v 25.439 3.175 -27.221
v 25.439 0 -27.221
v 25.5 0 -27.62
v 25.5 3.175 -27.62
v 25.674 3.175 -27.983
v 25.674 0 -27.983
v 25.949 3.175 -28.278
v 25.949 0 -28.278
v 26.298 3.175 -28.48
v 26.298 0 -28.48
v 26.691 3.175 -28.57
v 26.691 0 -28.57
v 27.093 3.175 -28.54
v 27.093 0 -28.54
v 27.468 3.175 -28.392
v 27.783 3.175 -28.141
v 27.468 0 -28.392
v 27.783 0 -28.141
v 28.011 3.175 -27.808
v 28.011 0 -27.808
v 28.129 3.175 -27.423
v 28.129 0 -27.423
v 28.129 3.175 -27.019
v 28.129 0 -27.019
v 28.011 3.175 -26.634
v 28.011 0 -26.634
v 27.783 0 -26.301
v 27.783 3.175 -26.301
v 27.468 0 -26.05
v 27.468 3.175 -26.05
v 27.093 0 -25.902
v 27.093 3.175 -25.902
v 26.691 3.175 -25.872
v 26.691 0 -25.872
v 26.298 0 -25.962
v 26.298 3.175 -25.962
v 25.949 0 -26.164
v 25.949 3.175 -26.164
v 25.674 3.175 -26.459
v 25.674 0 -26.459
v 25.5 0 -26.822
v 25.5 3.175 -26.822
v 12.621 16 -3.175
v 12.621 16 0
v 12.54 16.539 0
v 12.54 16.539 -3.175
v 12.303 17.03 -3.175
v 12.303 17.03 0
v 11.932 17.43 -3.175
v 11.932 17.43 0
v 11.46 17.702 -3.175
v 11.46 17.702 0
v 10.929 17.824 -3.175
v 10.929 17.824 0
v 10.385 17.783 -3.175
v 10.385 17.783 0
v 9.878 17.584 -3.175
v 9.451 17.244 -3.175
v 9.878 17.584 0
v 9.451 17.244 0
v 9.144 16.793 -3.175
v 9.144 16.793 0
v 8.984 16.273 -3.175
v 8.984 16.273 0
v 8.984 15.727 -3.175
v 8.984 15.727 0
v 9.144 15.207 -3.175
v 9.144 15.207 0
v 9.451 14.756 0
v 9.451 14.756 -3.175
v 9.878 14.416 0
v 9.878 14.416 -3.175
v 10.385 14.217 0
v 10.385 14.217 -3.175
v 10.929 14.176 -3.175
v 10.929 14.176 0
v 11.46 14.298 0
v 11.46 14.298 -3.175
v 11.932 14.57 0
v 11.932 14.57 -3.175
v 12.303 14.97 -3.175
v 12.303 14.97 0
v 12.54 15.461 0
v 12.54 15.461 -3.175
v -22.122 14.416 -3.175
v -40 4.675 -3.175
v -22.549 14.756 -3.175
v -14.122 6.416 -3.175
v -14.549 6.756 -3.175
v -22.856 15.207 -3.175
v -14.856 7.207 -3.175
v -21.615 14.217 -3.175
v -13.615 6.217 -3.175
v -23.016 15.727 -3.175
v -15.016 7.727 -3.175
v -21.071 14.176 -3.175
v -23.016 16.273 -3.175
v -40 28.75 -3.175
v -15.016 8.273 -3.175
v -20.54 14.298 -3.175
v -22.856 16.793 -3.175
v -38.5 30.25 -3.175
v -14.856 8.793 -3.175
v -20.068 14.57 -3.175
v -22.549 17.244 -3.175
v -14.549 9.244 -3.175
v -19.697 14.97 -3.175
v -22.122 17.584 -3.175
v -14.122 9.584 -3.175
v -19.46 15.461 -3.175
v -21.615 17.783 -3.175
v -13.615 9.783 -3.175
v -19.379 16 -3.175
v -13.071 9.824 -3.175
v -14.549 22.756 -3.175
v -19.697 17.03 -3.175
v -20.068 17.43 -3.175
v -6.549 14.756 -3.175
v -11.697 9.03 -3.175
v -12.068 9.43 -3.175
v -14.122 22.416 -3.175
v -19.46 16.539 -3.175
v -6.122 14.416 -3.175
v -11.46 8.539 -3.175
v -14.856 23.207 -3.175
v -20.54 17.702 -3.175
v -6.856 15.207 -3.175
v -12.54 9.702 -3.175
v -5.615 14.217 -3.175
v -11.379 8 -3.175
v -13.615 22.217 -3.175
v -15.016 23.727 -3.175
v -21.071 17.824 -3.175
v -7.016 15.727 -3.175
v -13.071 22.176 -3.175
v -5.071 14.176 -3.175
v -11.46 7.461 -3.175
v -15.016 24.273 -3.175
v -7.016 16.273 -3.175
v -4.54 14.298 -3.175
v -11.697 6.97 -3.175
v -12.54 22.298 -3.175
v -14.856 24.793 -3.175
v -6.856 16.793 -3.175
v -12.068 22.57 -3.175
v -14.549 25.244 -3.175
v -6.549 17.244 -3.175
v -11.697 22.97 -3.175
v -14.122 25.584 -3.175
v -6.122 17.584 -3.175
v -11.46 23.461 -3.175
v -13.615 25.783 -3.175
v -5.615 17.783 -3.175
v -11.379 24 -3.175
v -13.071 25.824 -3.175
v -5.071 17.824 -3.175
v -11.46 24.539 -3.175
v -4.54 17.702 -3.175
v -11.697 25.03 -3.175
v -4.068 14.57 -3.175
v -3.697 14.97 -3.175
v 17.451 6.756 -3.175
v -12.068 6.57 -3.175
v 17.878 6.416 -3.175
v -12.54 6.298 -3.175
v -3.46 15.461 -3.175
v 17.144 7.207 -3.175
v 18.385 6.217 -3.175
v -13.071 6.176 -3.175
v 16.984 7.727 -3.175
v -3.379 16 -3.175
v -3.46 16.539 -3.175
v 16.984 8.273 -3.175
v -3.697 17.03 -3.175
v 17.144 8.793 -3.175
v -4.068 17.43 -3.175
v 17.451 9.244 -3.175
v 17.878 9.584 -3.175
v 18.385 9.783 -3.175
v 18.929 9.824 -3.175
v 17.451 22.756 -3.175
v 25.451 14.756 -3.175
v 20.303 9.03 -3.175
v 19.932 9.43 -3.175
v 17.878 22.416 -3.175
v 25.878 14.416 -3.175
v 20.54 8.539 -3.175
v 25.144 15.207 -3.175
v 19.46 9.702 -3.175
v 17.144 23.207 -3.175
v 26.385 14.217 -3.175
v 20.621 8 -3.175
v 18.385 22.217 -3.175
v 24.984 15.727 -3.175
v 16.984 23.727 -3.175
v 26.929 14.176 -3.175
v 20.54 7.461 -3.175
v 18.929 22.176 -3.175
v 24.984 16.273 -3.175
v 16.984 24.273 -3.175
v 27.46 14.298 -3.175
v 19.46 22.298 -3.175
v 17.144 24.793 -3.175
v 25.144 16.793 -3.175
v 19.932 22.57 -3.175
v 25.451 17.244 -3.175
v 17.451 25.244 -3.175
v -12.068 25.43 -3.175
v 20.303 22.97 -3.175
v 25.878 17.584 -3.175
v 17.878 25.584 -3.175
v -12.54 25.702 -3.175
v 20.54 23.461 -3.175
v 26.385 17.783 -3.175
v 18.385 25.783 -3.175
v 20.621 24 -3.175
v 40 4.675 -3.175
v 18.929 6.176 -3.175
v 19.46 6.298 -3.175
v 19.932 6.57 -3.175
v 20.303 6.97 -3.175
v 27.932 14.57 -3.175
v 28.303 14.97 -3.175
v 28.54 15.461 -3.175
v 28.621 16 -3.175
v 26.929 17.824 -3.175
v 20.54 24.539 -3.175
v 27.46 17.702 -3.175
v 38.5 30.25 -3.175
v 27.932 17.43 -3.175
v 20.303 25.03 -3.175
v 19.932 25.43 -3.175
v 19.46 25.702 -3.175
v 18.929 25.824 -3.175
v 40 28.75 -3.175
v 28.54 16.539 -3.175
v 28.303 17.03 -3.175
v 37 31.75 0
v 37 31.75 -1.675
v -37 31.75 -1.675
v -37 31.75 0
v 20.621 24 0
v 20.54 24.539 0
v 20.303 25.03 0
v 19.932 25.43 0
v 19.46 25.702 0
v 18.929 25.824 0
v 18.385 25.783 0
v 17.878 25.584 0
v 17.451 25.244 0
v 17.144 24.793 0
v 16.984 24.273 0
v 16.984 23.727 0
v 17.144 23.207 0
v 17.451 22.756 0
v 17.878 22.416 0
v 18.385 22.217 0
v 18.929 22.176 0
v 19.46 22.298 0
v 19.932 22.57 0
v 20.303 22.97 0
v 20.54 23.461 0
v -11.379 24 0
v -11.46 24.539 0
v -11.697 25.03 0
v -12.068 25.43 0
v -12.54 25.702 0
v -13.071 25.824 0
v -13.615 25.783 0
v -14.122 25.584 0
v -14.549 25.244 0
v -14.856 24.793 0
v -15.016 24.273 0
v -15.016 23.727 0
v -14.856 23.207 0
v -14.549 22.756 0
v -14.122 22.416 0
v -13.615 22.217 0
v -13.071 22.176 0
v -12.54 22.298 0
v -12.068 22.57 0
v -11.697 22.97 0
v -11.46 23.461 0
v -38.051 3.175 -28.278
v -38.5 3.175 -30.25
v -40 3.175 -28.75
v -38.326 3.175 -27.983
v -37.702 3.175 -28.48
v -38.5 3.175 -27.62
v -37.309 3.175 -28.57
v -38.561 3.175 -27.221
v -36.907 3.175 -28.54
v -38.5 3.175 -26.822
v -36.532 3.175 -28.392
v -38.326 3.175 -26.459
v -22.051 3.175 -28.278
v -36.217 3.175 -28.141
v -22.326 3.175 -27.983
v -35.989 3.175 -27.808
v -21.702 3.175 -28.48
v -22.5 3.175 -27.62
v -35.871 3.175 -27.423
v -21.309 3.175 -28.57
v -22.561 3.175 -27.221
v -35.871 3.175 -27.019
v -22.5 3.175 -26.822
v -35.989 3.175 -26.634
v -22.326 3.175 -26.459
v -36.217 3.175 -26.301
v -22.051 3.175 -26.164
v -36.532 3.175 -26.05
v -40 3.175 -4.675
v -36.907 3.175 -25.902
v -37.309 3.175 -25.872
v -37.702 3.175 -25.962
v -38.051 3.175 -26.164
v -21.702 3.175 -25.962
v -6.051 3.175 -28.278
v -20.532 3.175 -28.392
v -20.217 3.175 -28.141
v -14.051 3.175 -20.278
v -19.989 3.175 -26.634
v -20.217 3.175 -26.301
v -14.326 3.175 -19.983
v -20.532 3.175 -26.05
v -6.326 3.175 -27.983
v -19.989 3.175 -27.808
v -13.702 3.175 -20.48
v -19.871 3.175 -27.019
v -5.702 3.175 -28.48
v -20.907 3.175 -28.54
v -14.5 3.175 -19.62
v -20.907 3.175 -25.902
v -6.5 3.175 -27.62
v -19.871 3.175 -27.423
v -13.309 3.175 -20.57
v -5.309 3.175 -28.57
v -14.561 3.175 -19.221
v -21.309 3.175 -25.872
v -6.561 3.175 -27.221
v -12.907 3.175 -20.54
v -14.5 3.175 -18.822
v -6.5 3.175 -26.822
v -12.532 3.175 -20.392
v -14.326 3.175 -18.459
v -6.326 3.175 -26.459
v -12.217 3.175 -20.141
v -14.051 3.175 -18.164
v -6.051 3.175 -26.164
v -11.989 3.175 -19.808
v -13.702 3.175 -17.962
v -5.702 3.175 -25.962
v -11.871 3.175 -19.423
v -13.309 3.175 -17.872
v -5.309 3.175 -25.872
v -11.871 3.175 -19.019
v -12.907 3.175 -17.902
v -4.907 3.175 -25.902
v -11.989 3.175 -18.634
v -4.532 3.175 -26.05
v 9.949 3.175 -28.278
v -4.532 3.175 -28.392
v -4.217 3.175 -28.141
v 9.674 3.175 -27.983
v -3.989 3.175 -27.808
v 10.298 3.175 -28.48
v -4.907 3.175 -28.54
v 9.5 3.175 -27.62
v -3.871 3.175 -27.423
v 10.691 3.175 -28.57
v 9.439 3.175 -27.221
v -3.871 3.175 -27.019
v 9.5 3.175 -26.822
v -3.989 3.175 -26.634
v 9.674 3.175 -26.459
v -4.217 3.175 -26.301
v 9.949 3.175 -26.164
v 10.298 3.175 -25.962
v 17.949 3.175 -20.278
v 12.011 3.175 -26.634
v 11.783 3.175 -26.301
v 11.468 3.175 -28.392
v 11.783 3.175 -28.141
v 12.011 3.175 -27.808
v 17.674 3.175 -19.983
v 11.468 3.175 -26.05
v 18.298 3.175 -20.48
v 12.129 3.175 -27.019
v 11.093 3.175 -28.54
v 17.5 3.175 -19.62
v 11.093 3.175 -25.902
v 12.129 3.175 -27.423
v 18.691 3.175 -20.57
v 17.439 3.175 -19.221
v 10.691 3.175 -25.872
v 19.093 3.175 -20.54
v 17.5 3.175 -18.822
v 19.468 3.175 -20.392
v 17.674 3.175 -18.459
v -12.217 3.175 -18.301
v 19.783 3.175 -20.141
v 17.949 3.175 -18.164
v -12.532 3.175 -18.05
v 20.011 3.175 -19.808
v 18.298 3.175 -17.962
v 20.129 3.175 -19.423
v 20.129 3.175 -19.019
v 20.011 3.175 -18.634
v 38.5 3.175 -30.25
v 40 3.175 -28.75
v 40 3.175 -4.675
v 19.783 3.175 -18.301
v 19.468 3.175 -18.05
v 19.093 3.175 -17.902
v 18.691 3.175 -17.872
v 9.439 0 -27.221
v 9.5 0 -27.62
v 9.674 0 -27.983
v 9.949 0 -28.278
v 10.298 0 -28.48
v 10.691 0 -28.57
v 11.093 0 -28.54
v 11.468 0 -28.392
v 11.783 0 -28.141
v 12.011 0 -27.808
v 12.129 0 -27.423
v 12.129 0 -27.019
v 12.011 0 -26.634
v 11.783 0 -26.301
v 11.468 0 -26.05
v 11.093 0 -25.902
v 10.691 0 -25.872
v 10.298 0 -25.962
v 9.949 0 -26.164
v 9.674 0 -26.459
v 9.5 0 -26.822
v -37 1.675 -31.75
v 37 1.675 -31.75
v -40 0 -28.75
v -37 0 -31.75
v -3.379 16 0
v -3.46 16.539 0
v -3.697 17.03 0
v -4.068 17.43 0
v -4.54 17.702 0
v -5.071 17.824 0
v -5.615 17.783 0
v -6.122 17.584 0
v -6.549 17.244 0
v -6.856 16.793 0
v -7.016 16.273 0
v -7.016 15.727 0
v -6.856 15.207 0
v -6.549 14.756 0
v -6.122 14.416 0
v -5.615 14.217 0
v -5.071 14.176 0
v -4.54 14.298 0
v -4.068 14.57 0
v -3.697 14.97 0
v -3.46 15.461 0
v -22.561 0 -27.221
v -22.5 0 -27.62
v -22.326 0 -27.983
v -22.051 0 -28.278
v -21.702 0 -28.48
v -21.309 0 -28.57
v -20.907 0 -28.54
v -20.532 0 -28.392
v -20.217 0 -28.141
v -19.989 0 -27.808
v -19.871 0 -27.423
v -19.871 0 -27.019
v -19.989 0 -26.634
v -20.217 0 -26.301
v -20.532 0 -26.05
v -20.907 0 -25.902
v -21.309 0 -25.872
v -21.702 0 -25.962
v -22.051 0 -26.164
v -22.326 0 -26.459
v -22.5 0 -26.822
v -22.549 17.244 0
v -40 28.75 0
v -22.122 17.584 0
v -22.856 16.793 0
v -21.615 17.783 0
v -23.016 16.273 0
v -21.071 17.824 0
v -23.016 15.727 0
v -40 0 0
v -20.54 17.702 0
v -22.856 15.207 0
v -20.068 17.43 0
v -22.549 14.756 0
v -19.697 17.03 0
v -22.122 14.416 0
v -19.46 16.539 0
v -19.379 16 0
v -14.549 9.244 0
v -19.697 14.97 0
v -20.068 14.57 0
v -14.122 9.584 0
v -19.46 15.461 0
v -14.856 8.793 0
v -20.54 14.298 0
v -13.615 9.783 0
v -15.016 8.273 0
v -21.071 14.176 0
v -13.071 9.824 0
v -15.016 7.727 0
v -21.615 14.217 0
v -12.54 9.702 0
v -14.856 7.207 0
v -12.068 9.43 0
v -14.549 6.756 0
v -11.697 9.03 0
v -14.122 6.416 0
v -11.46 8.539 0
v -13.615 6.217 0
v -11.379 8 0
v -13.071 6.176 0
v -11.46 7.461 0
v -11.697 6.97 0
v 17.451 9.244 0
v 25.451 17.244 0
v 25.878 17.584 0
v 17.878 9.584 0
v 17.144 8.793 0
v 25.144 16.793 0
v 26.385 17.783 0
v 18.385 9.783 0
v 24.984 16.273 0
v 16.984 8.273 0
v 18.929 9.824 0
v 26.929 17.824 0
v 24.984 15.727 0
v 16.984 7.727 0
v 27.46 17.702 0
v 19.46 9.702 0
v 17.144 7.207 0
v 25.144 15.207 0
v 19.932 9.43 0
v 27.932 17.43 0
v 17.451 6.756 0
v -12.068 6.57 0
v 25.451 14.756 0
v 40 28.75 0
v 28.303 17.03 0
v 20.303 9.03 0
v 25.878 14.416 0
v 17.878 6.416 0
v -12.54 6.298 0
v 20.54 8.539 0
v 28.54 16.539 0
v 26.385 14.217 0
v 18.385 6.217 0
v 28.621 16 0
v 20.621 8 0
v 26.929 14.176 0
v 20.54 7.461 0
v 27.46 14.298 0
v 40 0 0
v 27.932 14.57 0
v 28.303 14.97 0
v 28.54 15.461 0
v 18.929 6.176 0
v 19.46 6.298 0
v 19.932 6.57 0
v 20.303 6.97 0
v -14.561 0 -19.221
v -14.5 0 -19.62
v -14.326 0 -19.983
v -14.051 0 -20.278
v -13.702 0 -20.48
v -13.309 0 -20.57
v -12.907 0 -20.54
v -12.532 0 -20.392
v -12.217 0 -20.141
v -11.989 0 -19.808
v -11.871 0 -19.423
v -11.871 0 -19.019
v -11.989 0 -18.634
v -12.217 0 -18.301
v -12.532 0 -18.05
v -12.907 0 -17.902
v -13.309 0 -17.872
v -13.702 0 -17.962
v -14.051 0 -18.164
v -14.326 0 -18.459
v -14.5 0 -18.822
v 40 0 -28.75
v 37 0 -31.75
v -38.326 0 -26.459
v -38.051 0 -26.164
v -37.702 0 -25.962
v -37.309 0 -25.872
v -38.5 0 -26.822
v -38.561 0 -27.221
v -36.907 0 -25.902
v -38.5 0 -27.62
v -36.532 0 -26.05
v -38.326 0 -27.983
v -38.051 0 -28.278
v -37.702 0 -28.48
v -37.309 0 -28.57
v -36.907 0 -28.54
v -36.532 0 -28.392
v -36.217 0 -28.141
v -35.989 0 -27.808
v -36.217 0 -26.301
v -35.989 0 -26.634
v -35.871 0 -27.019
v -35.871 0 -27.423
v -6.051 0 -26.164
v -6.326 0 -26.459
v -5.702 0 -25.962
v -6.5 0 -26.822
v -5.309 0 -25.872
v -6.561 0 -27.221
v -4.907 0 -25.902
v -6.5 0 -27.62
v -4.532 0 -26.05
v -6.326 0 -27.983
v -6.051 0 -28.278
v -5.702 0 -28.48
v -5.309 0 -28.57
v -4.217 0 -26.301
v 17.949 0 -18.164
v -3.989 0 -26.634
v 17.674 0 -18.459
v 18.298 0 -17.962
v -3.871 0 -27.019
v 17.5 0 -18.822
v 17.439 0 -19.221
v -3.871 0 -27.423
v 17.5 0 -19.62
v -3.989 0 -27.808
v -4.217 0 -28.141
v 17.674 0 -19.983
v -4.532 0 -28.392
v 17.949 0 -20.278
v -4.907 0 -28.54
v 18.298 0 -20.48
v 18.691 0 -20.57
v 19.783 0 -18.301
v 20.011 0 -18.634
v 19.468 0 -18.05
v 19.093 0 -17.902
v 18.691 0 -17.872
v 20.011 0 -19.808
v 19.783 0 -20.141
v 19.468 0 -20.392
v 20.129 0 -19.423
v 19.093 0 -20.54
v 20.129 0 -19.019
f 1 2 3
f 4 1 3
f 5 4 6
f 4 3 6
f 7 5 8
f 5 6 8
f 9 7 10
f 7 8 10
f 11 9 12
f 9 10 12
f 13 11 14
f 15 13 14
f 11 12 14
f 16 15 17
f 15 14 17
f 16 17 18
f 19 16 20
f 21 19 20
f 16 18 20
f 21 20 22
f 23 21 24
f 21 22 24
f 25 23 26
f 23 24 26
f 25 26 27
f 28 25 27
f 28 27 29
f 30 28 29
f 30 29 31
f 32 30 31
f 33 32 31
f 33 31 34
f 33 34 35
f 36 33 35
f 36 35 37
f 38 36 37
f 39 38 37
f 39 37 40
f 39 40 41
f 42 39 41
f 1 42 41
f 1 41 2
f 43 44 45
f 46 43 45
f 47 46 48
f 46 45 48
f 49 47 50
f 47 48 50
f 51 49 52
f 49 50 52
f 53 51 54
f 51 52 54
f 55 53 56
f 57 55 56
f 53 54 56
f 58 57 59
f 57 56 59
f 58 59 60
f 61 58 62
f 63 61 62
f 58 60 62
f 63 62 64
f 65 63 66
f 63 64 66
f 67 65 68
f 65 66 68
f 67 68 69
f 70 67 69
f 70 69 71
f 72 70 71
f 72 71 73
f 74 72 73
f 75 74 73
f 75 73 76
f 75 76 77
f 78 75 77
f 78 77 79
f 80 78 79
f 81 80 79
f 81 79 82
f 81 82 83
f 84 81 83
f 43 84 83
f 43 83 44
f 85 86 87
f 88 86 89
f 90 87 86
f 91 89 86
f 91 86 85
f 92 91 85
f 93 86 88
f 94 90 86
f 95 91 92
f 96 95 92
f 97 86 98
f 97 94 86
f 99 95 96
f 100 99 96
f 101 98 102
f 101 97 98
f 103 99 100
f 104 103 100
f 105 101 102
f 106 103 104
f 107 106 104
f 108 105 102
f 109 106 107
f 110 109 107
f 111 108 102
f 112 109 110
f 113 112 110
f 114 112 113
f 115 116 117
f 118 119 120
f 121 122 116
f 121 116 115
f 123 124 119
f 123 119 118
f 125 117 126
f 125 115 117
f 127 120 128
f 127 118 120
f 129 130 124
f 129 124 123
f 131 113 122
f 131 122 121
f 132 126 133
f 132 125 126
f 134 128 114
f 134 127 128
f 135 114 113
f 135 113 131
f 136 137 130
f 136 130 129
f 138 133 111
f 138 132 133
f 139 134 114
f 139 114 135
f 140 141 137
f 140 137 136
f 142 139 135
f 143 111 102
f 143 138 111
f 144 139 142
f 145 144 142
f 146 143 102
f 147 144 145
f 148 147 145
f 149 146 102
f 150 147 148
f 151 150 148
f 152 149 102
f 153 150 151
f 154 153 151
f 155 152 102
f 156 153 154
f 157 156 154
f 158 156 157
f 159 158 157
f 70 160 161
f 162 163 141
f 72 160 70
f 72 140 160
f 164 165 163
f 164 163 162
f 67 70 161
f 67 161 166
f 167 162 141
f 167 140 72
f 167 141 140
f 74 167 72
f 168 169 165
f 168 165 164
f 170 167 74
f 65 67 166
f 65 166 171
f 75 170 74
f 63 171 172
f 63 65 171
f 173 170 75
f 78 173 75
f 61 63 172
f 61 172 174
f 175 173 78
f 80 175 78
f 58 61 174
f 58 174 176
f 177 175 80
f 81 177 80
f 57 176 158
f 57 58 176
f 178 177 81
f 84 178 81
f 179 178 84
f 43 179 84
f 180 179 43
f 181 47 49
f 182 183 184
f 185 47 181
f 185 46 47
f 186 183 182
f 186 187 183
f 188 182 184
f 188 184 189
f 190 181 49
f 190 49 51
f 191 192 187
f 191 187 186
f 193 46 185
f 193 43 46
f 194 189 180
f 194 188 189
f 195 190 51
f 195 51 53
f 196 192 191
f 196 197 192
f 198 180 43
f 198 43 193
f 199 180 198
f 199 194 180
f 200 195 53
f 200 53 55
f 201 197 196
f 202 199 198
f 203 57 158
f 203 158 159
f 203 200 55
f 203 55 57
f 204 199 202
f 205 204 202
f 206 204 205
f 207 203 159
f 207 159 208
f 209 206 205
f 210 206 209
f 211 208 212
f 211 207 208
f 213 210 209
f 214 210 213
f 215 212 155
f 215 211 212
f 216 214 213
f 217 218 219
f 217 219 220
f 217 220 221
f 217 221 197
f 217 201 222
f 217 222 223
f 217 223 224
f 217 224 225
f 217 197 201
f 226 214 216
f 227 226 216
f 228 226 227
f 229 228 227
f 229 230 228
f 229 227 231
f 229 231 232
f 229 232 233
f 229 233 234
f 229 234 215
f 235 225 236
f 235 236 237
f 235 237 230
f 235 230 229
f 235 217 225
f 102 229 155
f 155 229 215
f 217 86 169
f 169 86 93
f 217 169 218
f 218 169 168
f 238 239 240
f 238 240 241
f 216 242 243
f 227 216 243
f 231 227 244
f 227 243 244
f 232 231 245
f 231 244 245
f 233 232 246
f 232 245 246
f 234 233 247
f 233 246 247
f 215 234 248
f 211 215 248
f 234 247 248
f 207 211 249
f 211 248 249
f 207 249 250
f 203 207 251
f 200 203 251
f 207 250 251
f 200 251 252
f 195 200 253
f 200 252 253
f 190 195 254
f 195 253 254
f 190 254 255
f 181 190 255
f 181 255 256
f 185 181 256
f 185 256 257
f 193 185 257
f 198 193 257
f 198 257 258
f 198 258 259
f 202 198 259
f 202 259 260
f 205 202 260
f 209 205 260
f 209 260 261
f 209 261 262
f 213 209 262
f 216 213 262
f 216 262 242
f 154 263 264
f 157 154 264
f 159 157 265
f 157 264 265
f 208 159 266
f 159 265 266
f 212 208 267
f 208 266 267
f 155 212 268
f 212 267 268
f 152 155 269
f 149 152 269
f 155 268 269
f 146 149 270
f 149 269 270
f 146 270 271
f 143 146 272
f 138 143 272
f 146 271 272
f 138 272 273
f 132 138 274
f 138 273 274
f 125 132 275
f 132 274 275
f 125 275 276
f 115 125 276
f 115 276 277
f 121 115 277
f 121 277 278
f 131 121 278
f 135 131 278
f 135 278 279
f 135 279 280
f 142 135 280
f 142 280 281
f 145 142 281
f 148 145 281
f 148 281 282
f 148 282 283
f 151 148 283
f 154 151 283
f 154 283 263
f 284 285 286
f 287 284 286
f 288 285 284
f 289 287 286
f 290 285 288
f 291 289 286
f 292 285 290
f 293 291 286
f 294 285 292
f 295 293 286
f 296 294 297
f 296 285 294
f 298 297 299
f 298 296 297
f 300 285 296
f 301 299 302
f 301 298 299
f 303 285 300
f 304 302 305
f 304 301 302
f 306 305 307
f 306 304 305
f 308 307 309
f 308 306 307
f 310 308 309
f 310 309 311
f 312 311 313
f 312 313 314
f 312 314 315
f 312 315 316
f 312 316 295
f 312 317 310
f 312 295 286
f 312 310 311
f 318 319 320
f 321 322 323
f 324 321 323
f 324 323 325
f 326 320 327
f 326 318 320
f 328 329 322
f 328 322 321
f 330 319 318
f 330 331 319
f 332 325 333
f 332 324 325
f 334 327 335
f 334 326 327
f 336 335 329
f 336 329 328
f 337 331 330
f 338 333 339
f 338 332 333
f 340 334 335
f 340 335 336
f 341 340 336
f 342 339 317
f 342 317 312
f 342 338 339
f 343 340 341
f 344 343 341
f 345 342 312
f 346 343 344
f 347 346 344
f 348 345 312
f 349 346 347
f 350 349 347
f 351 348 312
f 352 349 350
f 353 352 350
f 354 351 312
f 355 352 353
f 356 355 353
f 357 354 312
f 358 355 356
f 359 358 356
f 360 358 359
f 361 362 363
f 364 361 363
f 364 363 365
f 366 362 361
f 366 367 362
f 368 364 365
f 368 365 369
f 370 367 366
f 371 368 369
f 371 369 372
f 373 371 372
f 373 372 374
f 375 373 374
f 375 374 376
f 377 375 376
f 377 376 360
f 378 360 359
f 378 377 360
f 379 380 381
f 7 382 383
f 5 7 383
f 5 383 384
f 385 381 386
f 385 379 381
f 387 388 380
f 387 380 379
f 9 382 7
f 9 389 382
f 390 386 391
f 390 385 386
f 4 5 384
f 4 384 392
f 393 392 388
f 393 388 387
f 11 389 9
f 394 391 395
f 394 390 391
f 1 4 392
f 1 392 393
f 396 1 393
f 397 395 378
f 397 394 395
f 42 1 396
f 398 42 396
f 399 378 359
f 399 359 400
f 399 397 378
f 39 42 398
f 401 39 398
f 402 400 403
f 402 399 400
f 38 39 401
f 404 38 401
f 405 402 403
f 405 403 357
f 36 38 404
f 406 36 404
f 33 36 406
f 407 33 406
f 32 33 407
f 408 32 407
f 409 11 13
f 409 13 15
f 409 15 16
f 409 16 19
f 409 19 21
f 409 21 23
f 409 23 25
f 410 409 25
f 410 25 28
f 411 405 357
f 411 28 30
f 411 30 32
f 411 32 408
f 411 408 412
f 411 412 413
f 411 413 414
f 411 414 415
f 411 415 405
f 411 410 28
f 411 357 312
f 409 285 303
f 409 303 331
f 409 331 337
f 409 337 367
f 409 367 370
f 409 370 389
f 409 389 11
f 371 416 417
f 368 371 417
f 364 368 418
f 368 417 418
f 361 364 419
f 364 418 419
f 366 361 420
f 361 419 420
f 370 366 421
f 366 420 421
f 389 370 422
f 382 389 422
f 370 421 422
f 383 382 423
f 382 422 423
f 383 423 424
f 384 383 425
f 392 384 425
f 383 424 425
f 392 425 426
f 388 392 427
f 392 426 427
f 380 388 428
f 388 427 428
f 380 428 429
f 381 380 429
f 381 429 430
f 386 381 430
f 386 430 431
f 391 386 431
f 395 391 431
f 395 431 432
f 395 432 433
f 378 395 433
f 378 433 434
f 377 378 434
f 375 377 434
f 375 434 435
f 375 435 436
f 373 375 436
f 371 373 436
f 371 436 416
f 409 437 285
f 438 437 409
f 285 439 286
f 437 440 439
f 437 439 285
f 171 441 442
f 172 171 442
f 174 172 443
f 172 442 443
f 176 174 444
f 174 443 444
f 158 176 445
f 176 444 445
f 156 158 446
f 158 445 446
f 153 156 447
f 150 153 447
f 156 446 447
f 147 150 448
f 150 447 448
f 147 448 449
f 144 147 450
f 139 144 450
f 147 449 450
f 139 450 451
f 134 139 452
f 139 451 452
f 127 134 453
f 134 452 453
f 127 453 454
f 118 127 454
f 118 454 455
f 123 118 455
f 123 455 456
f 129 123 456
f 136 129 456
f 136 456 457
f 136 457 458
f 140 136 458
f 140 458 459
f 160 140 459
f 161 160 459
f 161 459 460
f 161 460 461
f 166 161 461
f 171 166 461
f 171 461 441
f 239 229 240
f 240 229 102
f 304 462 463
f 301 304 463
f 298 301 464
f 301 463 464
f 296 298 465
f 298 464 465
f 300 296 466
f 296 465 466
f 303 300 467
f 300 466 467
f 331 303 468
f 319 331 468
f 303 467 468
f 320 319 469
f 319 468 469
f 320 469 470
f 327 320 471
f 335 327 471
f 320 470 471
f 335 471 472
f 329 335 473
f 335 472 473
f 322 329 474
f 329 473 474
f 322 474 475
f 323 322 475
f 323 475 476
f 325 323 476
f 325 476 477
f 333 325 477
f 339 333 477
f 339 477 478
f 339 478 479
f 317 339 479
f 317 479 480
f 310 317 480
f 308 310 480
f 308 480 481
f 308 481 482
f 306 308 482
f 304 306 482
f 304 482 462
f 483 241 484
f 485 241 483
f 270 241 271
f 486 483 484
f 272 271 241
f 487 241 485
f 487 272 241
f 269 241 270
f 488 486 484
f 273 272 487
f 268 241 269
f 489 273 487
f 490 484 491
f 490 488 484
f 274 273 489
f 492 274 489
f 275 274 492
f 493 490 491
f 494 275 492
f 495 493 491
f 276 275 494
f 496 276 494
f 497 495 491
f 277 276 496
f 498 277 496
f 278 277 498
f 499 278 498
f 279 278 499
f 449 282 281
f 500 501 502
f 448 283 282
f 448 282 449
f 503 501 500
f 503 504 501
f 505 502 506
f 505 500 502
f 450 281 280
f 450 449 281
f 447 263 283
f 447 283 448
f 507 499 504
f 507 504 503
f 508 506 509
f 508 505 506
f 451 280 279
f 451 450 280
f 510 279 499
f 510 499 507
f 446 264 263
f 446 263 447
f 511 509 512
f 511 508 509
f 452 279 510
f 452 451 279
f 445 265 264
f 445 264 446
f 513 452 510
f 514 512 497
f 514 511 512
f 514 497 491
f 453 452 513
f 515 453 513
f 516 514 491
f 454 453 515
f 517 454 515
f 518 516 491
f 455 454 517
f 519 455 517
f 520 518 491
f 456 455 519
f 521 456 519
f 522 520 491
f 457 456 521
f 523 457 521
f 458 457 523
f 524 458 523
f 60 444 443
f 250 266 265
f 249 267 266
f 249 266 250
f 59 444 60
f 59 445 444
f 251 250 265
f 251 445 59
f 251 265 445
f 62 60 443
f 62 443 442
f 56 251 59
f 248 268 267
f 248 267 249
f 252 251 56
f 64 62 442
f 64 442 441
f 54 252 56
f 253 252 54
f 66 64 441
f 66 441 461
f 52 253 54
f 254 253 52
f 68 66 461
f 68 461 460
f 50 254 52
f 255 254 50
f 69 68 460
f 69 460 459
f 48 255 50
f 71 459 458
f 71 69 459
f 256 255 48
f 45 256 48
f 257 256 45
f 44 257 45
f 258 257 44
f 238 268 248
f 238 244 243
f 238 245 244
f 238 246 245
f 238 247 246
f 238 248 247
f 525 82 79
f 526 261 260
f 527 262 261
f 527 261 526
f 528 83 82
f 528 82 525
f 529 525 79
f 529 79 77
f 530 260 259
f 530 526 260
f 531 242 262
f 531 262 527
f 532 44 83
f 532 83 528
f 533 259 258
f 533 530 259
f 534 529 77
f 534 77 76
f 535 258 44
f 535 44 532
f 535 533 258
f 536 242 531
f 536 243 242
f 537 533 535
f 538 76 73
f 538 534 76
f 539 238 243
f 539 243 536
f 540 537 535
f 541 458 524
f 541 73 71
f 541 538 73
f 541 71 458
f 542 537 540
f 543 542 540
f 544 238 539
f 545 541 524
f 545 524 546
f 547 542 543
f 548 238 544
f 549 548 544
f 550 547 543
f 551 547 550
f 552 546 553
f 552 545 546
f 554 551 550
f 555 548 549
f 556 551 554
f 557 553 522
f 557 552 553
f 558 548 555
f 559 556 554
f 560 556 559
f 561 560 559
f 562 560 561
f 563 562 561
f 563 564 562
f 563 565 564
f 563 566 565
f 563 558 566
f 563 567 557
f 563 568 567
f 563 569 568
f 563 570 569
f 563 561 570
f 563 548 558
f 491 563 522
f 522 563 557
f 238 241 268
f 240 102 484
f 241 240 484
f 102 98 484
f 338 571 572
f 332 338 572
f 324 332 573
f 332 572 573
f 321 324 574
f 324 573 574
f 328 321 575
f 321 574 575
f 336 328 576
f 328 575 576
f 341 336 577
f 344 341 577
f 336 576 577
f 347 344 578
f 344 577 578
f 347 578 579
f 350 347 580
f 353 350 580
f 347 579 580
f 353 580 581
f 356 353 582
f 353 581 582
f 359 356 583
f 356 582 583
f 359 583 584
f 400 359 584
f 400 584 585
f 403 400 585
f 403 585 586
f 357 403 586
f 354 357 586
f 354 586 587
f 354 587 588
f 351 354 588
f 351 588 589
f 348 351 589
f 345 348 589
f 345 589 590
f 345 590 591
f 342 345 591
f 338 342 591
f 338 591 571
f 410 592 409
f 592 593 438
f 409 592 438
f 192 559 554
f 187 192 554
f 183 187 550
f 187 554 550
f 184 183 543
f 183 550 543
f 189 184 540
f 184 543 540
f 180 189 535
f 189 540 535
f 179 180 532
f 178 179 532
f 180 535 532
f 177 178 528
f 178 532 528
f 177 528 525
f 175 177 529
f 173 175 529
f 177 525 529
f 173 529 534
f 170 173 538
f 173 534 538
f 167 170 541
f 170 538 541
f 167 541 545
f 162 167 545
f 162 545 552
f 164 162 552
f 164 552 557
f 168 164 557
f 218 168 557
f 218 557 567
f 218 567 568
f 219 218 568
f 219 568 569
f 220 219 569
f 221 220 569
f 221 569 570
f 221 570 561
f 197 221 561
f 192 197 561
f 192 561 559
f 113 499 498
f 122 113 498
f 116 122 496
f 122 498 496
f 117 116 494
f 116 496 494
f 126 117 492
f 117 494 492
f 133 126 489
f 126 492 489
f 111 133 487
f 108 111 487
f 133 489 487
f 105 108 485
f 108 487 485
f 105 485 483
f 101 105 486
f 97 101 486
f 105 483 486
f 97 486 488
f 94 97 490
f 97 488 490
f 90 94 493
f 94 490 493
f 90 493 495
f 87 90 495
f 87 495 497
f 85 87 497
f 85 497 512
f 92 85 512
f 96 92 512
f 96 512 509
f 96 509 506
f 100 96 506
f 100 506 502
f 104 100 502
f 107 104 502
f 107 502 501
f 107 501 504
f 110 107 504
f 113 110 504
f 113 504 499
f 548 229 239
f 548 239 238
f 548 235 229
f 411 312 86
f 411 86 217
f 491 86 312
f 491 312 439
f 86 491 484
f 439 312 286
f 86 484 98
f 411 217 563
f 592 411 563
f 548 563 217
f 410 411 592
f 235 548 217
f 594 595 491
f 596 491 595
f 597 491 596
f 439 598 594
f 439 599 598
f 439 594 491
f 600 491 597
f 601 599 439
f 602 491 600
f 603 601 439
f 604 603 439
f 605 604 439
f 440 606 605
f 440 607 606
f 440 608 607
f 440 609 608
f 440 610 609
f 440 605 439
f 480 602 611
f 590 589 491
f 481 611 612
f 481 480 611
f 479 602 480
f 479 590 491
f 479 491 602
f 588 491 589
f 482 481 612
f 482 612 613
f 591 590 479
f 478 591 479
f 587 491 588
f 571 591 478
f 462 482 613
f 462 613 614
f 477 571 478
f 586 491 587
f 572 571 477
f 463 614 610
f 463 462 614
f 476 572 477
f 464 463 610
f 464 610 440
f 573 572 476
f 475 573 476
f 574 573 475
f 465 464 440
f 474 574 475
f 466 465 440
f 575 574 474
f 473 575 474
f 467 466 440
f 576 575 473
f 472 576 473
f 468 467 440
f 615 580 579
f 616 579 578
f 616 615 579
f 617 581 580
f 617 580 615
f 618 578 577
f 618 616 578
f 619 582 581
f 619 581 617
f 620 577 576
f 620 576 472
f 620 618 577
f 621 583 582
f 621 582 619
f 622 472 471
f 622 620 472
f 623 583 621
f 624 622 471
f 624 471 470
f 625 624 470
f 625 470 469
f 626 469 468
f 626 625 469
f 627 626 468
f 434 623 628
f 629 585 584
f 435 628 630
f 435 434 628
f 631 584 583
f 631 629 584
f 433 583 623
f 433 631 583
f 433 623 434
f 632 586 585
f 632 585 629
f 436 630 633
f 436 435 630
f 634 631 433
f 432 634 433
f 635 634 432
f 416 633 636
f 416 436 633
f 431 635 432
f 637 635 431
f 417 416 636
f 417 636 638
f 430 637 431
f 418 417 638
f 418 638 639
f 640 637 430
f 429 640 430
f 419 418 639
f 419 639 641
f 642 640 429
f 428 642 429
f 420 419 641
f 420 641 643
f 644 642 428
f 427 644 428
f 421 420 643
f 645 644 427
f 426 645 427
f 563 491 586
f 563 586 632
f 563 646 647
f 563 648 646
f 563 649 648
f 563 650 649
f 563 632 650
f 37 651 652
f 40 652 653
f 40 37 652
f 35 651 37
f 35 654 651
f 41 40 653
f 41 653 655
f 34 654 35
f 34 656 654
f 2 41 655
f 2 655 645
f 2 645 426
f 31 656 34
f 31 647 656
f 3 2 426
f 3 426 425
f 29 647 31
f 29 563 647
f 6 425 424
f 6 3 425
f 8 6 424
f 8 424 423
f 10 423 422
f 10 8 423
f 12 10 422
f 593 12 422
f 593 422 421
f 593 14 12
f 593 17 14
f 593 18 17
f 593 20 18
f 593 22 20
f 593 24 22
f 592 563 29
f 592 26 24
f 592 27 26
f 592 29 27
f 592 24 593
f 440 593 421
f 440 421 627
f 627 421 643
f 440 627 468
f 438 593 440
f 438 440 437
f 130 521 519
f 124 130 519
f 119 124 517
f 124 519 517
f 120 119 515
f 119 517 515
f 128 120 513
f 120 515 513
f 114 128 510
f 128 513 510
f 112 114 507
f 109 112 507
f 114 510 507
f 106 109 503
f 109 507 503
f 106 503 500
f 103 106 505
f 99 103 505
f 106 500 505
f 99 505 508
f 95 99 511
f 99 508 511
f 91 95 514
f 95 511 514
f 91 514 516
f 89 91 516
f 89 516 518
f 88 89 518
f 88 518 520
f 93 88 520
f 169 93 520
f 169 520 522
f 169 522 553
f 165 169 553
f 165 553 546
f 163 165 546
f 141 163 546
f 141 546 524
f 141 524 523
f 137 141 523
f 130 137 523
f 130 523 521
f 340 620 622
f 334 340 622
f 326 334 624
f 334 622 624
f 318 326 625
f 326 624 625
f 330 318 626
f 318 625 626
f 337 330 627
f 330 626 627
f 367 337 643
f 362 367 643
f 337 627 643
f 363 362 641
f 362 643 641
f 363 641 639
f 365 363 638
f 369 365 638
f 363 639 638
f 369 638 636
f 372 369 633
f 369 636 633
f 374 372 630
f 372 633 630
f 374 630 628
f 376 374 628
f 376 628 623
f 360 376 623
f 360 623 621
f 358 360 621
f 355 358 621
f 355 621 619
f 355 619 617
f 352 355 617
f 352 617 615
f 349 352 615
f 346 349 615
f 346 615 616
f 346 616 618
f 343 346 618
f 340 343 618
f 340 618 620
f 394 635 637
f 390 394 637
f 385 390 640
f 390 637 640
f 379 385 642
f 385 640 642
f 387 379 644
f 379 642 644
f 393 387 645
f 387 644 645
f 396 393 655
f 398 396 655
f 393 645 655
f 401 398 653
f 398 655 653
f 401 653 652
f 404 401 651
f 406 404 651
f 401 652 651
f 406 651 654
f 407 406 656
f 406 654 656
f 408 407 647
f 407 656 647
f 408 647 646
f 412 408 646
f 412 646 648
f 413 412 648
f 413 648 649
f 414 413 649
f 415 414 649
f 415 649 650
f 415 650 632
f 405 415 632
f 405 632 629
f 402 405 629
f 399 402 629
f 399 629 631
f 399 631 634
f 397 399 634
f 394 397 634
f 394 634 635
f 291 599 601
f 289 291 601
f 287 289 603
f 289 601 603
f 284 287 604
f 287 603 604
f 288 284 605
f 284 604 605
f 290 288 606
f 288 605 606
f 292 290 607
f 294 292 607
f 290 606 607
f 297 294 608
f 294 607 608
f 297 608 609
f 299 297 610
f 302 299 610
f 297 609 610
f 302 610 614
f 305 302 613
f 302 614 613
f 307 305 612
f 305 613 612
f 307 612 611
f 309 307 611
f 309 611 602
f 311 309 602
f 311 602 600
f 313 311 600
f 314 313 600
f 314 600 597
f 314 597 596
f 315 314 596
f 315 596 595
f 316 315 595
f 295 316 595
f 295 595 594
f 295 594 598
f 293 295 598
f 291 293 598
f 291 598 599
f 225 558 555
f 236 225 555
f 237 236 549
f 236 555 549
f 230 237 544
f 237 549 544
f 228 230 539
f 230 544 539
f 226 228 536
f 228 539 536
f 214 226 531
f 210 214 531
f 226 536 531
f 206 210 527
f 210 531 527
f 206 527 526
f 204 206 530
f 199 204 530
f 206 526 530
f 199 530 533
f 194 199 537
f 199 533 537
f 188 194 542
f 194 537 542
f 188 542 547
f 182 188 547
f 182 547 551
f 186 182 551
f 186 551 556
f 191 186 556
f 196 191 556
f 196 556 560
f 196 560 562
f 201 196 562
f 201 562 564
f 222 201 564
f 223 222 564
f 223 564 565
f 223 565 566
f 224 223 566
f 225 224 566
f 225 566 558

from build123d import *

# Parameters (mm, degrees)
BOSS_EXTRUDE1_DEPTH   = 40
CHAMFER1_SIZE         = 1.5
CHAMFER2_SIZE         = 3
F_6_32_TAPPED_HOLE1_D = 2.7051
F_6_CLEARANCE_HOLE1_D = 3.6576


with BuildPart() as part:
    # Sketch1 → Boss-Extrude1 (new body, symmetric)
    with BuildSketch(Plane(origin=(0, 0, 0), x_dir=(0, 0, -1), z_dir=(1, 0, 0))):
        Polygon((0, 0), (31.75, 0), (31.75, 3.175), (3.175, 3.175), (3.175, 31.75), (0, 31.75), align=None)
    extrude(amount=BOSS_EXTRUDE1_DEPTH, both=True)

    # Chamfer1
    chamfer1_edges = [part.edges().sort_by_distance(p)[0] for p in [
        (0, 31.75, -3.175),
        (0, 3.175, -3.175),
        (0, 3.175, -31.75),
    ]]
    chamfer(chamfer1_edges, length=CHAMFER1_SIZE)

    # Chamfer2
    chamfer2_edges = [part.edges().sort_by_distance(p)[0] for p in [
        (-40, 31.75, -0.8375),
        (-40, 0.8375, -31.75),
        (40, 0.8375, -31.75),
        (40, 31.75, -0.8375),
    ]]
    chamfer(chamfer2_edges, length=CHAMFER2_SIZE)

    # #6-32 Tapped Hole1 (through all)
    with Locations(Plane(origin=(0, 3.175, 0), x_dir=(1, 0, 0), z_dir=(0, 1, 0))):
        with Locations((-37.208, 27.221), (10.792, 27.221), (-5.208, 27.221), (-13.208, 19.221), (-21.208, 27.221), (18.792, 19.221), (26.792, 27.221)):
            Hole(F_6_32_TAPPED_HOLE1_D / 2)

    # #6 Clearance Hole1 (through all)
    with Locations(Plane(origin=(0, 0, -3.175), x_dir=(-1, 0, 0), z_dir=(0, 0, -1))):
        with Locations((-10.792, 16), (-18.792, 8), (-18.792, 24), (-26.792, 16), (13.208, 24), (5.208, 16), (13.208, 8), (21.208, 16)):
            Hole(F_6_CLEARANCE_HOLE1_D / 2)


solid = part.part
